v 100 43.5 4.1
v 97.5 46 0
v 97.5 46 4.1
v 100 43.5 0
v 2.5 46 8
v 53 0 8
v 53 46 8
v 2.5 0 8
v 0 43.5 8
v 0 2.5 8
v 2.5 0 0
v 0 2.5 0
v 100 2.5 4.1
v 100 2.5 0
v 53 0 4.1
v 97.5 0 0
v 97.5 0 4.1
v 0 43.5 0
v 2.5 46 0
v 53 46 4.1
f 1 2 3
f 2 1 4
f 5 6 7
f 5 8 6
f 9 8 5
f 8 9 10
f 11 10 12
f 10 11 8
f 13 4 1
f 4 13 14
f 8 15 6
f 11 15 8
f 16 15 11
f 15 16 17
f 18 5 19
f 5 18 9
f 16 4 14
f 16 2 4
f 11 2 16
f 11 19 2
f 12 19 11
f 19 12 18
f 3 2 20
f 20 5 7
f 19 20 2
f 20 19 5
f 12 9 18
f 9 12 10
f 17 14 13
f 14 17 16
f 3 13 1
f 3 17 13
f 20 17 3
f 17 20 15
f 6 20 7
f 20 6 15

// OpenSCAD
$fn = 32;

// ----------------------------------------------------------------------
// Stepped bar: endstep, 100 x 46 x 8/4.1 mm
// ----------------------------------------------------------------------

// --- parameters (mm) ---
bar_l = 100;              // bar length, X
bar_w = 46;               // bar width, Y
plate_t = 8;              // thickness of the thick zone, Z
thin_t = 4.1;             // thickness of the thin zone
corner_c = 2.5;           // corner chamfer of the bar
step_cut = 3.9;           // material removed from the thin zone
step_x = 53;              // step position from the left end
depth_1 = 3.9;            // depth of cut 1 from the top face

profile = [[2.5, 0], [97.5, 0], [100, 2.5], [100, 43.5], [97.5, 46], [2.5, 46], [0, 43.5], [0, 2.5]];  // primary outline, 8 points, counter clockwise
void_1 = [[53, -1], [101, -1], [101, 47], [53, 47]];  // thin zone beyond the step, 4 points

// --- the one profile operation ---
difference() {
  linear_extrude(height = plate_t) polygon(points = profile);
  translate([0, 0, plate_t - depth_1])
    linear_extrude(height = depth_1 + 1) polygon(points = void_1);
}
